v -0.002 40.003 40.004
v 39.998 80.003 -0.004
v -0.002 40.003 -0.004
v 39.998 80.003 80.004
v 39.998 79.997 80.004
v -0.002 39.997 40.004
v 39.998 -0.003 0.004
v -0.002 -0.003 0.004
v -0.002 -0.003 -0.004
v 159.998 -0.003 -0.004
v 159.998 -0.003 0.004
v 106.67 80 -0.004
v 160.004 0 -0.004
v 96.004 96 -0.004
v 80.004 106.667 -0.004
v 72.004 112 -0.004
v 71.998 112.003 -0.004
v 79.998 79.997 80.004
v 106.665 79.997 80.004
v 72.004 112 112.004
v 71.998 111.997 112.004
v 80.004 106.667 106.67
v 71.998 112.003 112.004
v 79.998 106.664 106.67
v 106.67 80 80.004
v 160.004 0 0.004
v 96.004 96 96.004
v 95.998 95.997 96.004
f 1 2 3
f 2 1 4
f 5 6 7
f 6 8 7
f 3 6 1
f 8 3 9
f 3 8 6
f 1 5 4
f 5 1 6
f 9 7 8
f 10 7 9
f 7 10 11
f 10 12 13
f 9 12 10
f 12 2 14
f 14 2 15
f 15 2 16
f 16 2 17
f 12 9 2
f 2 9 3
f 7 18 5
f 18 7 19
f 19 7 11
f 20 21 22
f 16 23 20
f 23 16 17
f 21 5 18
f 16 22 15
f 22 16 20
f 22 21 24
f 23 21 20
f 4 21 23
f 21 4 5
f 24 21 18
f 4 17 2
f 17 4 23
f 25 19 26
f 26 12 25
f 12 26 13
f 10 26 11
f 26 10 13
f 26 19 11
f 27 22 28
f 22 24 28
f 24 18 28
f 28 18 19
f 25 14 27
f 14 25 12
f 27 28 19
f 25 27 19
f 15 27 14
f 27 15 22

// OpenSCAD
/* Veranschaulichung des Vorlesungsbeispiels
   Quelle: Wikipedia
   
   Zur Visualisierung die "color" Zeilen alle einkommentieren. Nur Vorschau (F5) mit Farbe.
   
   Zur Erzeugung der einzelenn STL Dateien jweils nur eine Farbe einkommentieren. 
   
   Copyright, 2026, Mathias Moog, Hochschule Ansbach, Deutschland, CC-BY-NC-SA
 */
 
// Skalierung
S = 40;

d =0.01;  // Dimension of the spheres arround the points
$fn=3;    // low resultion of the spheres


// Punkte, beachte z=y
// Sortierung x dann y
P = [ [0,0], [0,1], 
      [1,0], [1,2],
      [1.8,2.8],
      [2,0], [2,2], [2,8/3],
      [2.4,2.4],
      [8/3,2],
      [4,0] ];
 
// create a small sphere arround the point p
module point( p ) {
  translate(S*p) sphere(d=d);
}


// Schneide in x und y Richtung
module cut(u=[0,0],o=[4,4]) {
  hull() {  
    for (p=P) 
      if (p[0]>=u[0] && p[1]>=u[1] && 
          p[0]<=o[0] && p[1]<=o[1]) {
           echo( p );
           point( [p[0],p[1],0] );
           point( [p[0],p[1],p[1]] ); 
          }
      }  
}

// Alles
//cut();

// x<=1
color("yellow") cut( u=[0,0], o=[1,4]);
// 1<=x<=2, y<=2
color("green") cut( u=[1,0], o=[2,2]);
// 1<=x<=2, y>=2
color("blue") cut( u=[1,2], o=[2,4]);
// x>=2, y<=2
color("orange") cut( u=[2,0], o=[4,2]);
// x>=2, y>=2
color("red") cut( u=[2,2], o=[4,4]);

    
